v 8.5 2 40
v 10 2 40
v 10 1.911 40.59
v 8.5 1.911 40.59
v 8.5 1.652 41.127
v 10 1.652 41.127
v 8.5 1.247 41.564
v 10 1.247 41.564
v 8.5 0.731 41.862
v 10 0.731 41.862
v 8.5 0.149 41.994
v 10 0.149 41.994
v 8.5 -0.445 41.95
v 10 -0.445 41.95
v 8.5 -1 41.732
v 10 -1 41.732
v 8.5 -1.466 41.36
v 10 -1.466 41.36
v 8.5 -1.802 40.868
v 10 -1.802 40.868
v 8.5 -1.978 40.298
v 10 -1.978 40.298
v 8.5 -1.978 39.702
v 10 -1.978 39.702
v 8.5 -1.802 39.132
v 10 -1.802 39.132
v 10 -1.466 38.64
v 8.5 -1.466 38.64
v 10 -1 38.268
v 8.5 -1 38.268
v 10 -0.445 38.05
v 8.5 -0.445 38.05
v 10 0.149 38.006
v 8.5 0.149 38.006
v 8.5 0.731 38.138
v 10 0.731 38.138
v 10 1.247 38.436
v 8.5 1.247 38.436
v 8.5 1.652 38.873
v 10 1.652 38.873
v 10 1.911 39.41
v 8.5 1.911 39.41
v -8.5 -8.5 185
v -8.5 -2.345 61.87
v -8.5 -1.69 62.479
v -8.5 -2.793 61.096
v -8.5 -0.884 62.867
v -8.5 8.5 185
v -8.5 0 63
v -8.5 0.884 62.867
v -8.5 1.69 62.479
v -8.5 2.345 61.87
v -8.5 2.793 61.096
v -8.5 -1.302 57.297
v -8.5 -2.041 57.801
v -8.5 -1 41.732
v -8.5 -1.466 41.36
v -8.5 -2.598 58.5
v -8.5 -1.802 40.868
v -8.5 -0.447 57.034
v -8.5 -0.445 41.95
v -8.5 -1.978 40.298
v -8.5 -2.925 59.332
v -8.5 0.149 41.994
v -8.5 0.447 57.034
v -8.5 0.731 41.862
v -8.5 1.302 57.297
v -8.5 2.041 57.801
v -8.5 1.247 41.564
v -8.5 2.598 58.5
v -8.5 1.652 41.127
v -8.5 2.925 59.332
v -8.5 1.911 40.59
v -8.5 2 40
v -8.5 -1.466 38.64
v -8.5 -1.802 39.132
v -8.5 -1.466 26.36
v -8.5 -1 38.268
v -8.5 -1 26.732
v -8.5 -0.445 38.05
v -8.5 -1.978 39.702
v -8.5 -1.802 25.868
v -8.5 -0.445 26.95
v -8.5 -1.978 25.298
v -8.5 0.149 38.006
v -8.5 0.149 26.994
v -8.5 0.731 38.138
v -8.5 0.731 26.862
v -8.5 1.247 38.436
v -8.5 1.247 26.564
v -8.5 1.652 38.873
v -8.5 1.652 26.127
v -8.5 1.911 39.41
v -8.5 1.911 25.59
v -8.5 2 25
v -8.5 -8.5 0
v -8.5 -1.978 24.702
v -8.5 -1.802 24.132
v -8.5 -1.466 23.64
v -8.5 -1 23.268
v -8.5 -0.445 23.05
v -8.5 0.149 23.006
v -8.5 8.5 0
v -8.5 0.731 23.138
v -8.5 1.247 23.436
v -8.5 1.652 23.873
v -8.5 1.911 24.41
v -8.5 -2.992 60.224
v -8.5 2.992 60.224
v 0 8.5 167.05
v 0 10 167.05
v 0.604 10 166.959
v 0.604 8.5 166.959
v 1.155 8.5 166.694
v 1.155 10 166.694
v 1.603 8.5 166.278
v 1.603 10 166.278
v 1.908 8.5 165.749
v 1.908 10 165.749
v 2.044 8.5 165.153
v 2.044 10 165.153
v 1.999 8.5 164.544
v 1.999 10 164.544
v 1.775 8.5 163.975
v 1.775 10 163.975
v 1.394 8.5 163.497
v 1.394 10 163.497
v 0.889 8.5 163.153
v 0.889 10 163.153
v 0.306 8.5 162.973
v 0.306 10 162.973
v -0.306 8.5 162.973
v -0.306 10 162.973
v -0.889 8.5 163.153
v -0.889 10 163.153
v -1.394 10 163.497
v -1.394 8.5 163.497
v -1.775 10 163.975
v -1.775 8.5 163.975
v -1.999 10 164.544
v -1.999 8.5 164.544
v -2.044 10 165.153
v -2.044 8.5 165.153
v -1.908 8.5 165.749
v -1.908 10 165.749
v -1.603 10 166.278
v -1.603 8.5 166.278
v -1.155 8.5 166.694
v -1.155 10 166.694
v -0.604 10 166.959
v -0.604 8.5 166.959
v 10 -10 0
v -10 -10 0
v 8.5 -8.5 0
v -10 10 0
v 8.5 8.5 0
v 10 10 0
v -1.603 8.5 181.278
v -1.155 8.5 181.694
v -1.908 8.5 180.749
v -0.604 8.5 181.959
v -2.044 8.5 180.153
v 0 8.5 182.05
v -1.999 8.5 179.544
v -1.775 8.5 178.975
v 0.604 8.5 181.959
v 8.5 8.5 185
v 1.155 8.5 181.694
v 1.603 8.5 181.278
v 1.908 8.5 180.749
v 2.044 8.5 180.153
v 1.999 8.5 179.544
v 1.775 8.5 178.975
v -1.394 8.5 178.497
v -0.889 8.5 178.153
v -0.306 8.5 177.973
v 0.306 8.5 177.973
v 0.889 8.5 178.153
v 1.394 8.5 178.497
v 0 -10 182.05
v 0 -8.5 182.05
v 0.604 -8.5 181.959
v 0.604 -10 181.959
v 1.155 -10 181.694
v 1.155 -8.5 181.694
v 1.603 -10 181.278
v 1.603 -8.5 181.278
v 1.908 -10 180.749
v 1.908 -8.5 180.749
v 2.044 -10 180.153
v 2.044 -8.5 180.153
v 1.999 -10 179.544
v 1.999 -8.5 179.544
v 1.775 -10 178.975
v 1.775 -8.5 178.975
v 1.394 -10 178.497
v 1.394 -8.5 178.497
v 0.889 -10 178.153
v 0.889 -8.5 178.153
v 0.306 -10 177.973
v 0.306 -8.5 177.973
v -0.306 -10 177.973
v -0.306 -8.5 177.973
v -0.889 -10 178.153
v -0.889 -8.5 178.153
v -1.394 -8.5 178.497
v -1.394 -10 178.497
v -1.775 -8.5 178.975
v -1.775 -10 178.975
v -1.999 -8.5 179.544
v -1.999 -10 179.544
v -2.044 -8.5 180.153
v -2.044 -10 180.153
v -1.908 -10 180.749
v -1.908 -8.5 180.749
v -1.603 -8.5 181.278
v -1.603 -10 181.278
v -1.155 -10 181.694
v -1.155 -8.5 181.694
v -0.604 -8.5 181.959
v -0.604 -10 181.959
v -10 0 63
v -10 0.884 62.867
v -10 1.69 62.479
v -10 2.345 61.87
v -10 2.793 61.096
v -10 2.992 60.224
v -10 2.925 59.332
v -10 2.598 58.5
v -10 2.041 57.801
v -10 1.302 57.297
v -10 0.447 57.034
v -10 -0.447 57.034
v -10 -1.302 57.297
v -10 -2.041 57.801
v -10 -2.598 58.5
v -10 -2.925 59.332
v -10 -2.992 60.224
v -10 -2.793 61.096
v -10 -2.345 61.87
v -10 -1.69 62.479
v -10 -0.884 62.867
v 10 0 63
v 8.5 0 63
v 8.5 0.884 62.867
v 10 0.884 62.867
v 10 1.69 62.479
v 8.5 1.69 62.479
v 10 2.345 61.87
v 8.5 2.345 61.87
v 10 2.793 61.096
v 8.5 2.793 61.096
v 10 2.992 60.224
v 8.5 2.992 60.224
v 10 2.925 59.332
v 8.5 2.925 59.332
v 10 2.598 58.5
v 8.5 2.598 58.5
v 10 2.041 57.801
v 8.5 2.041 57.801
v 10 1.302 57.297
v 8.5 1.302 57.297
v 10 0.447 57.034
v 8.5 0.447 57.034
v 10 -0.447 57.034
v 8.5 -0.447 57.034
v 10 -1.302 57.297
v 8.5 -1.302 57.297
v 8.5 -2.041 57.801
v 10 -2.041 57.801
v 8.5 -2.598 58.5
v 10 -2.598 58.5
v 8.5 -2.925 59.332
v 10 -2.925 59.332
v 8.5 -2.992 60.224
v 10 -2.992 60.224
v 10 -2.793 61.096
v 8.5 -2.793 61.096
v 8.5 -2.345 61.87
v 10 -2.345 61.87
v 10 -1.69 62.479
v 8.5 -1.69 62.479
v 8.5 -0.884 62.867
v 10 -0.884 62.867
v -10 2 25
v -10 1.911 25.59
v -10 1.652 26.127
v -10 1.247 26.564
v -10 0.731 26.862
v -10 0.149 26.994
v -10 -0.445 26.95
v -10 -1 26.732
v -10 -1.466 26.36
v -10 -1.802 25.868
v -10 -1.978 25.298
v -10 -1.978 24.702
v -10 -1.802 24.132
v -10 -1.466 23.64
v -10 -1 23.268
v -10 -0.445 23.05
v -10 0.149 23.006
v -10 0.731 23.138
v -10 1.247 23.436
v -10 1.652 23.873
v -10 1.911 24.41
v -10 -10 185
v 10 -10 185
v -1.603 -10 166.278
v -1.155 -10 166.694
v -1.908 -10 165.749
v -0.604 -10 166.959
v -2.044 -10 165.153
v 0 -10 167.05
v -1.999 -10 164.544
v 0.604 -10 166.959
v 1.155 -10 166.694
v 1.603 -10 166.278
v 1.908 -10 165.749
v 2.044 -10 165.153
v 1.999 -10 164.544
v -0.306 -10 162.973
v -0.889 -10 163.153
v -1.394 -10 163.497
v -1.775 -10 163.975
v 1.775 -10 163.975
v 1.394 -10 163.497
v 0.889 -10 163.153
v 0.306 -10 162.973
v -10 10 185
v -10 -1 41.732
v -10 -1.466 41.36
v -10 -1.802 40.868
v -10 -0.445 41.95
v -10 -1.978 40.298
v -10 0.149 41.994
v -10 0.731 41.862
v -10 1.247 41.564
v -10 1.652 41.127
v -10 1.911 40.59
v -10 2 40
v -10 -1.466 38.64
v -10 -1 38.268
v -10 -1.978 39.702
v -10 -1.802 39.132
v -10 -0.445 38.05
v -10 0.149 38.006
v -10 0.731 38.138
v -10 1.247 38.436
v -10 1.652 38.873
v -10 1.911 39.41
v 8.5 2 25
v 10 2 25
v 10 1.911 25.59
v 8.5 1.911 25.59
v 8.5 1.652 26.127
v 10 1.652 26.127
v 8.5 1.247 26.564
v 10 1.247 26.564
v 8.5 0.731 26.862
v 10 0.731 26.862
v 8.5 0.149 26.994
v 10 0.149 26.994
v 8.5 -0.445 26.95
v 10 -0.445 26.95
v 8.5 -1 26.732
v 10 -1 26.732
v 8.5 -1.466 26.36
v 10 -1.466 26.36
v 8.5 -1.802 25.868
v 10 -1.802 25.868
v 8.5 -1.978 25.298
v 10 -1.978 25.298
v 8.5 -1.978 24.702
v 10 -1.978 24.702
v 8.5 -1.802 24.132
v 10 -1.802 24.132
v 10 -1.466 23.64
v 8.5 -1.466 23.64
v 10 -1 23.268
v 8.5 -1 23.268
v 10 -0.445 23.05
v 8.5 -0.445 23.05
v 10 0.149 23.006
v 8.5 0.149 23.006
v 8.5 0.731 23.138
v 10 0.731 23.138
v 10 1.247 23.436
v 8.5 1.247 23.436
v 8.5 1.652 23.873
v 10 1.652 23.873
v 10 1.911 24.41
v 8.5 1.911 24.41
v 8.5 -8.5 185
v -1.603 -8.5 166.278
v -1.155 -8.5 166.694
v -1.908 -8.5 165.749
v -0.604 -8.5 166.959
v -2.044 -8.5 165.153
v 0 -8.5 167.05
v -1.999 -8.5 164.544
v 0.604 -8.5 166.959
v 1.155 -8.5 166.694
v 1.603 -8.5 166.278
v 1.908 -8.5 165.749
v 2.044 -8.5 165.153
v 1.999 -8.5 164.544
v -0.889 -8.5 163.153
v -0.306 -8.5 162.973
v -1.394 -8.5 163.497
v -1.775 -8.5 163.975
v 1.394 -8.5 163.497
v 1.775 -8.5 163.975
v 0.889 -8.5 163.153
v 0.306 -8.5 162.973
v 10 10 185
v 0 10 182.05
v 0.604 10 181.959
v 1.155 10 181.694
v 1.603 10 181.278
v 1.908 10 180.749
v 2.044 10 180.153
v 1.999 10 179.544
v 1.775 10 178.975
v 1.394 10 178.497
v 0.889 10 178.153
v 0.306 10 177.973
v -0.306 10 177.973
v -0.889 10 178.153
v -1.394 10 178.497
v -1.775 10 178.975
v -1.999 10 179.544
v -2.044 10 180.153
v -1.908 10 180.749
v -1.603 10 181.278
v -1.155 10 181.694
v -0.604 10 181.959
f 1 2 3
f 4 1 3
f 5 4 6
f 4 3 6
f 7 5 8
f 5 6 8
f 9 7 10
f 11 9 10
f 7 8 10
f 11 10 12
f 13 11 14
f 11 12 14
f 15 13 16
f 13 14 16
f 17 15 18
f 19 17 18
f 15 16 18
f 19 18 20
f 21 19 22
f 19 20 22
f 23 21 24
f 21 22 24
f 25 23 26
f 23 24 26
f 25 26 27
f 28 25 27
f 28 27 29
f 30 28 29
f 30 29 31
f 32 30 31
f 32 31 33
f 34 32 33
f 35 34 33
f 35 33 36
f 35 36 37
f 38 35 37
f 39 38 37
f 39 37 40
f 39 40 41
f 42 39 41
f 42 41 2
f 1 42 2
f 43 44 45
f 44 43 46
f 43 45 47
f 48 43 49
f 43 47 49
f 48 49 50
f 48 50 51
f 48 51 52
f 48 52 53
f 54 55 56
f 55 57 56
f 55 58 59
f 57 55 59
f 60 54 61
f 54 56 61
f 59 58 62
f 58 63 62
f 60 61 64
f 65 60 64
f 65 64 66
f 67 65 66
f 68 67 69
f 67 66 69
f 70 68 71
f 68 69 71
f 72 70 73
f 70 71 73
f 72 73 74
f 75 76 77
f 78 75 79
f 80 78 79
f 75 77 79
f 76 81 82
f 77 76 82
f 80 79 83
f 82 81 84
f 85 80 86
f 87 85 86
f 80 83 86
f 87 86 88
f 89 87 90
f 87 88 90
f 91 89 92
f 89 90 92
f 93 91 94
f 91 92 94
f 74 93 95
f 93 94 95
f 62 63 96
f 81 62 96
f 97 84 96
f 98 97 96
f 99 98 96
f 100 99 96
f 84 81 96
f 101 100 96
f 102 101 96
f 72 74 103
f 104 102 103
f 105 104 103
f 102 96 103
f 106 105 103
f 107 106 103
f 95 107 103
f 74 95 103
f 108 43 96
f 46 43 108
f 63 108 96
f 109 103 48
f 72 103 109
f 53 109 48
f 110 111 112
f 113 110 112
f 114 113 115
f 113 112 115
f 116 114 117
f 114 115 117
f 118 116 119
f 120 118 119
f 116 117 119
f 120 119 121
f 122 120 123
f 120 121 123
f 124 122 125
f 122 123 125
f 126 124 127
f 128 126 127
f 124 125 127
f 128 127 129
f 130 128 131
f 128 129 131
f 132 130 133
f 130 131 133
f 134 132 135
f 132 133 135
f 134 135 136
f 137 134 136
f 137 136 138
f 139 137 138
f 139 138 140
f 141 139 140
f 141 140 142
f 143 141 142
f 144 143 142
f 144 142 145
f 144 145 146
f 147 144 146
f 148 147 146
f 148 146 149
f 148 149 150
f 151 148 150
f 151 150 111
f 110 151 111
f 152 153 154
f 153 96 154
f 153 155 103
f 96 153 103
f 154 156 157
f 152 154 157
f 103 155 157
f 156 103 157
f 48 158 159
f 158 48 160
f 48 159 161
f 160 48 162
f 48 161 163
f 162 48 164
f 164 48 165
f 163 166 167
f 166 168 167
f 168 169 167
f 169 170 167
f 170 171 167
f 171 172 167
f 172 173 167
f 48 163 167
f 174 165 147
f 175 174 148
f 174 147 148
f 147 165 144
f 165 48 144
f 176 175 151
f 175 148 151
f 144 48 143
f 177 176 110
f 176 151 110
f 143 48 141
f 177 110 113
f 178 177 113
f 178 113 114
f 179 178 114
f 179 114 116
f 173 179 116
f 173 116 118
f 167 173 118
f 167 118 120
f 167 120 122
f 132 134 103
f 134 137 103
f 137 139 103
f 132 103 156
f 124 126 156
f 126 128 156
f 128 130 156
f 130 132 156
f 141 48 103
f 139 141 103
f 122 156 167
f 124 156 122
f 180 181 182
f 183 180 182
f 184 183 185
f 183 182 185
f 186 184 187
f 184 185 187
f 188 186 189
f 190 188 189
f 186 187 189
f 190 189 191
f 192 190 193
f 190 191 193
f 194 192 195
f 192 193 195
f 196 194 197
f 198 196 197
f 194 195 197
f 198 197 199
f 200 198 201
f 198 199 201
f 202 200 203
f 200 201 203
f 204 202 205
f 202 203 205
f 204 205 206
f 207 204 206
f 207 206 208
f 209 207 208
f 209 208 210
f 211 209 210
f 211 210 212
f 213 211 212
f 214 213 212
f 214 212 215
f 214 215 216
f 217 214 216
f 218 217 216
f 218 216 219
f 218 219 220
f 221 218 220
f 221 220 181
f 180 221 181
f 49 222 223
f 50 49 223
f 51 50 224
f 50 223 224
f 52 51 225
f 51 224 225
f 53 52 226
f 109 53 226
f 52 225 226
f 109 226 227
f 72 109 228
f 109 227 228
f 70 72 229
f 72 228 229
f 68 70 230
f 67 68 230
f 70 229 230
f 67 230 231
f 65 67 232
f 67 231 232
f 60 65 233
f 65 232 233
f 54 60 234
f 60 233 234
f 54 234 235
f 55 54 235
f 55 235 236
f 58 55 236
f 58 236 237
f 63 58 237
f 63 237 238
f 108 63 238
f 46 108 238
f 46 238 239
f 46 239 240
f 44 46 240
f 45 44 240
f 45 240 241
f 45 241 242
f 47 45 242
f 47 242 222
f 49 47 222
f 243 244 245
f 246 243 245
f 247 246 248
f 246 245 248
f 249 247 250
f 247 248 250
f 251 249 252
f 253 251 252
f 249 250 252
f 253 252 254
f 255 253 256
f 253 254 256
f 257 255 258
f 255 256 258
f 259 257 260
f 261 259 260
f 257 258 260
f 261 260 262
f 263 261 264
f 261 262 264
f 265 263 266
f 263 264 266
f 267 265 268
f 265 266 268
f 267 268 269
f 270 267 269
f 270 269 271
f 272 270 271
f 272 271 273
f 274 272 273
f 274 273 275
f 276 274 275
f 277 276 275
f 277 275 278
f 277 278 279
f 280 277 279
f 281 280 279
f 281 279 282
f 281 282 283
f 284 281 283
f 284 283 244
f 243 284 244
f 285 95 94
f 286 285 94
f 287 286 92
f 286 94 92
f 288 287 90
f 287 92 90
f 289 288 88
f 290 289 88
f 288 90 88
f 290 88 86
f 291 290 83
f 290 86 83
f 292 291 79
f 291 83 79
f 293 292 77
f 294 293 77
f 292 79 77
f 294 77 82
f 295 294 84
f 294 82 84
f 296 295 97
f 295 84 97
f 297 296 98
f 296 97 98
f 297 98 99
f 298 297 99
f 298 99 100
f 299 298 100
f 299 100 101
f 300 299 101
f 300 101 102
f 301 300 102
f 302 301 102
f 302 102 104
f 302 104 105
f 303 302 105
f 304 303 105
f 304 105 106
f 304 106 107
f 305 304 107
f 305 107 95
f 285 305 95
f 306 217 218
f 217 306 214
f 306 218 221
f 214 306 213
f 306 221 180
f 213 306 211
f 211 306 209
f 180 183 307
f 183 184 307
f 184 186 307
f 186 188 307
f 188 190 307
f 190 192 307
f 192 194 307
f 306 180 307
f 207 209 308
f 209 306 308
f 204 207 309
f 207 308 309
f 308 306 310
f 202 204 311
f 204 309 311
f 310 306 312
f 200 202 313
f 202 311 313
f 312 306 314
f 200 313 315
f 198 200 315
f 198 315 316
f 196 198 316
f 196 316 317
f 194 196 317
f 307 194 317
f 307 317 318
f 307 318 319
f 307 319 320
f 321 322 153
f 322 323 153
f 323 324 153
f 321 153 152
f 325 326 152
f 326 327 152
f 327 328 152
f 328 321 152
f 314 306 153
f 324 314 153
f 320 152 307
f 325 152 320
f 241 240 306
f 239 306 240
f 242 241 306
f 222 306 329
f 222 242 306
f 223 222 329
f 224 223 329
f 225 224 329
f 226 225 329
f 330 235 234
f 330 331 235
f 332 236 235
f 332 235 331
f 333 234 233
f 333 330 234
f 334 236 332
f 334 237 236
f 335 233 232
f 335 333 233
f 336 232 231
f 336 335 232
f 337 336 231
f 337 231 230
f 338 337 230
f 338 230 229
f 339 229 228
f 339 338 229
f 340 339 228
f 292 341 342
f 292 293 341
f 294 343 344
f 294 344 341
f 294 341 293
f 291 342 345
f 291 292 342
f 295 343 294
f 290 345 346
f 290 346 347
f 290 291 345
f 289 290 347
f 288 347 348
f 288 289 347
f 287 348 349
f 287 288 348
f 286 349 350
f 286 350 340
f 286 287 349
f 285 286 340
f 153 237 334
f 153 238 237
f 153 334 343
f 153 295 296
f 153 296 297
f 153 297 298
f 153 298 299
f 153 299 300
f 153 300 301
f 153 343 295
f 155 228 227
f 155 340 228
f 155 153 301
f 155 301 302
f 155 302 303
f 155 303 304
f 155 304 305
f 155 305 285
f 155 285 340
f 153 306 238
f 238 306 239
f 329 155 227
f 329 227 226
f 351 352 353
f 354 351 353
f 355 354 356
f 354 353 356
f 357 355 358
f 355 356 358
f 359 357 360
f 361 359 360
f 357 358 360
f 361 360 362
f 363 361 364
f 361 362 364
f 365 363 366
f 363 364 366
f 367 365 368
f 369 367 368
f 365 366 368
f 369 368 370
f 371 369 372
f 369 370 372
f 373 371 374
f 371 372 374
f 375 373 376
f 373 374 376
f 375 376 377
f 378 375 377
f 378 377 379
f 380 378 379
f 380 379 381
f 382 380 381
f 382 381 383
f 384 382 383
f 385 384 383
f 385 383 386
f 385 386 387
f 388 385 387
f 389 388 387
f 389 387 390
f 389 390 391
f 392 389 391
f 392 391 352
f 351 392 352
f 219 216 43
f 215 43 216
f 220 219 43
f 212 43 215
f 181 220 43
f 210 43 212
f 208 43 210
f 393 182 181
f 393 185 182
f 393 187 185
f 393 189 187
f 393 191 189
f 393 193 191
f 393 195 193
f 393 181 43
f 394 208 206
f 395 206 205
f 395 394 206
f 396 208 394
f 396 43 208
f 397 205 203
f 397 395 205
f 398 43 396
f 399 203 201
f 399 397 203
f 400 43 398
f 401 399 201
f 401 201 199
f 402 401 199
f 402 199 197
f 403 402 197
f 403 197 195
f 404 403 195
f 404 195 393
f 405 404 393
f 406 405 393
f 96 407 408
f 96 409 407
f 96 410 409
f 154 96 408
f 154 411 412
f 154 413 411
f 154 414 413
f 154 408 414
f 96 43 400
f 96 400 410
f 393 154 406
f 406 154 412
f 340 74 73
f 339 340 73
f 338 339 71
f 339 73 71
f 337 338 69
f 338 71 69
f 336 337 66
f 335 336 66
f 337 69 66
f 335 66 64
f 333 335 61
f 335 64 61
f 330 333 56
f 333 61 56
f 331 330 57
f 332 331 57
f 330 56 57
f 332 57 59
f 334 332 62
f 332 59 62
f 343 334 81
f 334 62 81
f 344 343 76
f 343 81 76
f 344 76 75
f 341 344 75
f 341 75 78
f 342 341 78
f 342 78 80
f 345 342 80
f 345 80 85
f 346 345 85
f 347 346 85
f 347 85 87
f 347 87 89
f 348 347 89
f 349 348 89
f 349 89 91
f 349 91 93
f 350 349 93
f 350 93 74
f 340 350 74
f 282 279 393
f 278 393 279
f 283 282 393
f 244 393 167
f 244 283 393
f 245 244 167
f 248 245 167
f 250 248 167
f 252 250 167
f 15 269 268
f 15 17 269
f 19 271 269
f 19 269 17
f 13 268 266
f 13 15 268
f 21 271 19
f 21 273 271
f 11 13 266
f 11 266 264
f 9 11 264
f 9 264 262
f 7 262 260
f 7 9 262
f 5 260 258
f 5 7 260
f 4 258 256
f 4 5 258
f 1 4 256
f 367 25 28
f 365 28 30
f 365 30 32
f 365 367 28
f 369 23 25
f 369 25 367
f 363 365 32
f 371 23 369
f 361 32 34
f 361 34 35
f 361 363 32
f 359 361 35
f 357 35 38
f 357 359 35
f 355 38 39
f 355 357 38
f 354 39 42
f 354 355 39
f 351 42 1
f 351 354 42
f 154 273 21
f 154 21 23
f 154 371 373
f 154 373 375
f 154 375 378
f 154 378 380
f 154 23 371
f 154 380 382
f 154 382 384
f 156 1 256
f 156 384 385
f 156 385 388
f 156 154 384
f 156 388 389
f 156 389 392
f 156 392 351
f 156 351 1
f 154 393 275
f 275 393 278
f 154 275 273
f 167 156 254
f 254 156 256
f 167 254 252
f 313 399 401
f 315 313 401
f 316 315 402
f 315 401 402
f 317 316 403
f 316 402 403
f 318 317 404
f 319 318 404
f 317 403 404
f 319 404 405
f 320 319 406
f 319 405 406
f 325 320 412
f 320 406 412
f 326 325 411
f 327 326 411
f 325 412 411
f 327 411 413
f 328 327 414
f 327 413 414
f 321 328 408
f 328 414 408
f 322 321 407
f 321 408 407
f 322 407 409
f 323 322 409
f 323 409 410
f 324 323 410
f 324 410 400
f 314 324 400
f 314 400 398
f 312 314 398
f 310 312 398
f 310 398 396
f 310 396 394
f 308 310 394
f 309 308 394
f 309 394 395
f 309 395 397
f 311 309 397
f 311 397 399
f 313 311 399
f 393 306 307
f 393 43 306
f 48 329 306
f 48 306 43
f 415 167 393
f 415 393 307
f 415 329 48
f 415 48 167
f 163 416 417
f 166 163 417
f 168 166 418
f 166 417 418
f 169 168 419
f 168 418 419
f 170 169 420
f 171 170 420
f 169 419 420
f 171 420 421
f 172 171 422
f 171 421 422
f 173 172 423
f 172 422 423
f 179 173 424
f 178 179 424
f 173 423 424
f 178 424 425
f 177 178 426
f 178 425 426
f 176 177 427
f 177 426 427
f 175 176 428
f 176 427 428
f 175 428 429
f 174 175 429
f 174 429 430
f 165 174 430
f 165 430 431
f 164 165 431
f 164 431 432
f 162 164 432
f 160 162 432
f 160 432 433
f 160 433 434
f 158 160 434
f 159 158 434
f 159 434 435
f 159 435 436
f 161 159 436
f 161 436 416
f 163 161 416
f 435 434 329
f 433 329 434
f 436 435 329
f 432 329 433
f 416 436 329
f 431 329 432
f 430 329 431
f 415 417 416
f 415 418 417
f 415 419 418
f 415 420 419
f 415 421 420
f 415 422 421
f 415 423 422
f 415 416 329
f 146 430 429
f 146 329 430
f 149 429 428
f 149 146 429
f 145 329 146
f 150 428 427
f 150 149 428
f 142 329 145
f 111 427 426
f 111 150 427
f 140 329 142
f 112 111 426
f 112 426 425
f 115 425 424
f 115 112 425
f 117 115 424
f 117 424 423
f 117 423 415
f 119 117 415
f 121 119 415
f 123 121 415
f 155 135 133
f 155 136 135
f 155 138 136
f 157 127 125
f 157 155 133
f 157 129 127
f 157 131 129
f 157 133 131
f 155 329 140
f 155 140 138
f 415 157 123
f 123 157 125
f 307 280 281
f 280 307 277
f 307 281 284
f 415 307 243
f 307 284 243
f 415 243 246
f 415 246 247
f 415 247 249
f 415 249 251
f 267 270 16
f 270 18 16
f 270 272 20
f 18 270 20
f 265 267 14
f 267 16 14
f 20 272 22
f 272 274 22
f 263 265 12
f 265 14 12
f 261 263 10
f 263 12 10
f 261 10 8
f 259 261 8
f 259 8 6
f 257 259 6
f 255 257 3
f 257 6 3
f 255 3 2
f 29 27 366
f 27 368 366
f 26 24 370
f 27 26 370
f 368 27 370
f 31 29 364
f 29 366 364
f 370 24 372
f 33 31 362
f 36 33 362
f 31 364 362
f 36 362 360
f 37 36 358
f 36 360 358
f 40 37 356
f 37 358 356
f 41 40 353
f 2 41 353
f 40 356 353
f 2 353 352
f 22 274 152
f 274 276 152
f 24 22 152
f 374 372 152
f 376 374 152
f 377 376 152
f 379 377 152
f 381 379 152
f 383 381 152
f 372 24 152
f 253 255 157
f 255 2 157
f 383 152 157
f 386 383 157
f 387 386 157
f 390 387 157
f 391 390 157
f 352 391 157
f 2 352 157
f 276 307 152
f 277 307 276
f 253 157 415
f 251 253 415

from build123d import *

# Parameters (mm, degrees)
SKETCH_1_W          = 20
SKETCH_1_H          = 20
SKETCH_1_W_2        = 17
SKETCH_1_H_2        = 17
EXTRUDE_1_DEPTH     = 185
SKETCH_2_R          = 2.05
CUT_EXTRUDE_1_DEPTH = 187.346451536
SKETCH_3_R          = 2
CUT_EXTRUDE_2_DEPTH = 187.346451536
SKETCH_4_R          = 3
CUT_EXTRUDE_3_DEPTH = 187.346451536


with BuildPart() as part:
    # 草图1 → 凸台-拉伸1 (new body)
    with BuildSketch(Plane.XY):
        Rectangle(SKETCH_1_W, SKETCH_1_H)
        Rectangle(SKETCH_1_W_2, SKETCH_1_H_2, mode=Mode.SUBTRACT)
    extrude(amount=EXTRUDE_1_DEPTH)

    # 草图2 → 切除-拉伸1 (cut, through all)
    with BuildSketch(Plane(origin=(0, 10, 0), x_dir=(1, 0, 0), z_dir=(0, 1, 0))):
        with Locations(Location((0, -180, 0), (0, 0, 270))):
            Circle(SKETCH_2_R)
        with Locations(Location((0, -165, 0), (0, 0, 270))):
            Circle(SKETCH_2_R)
    extrude(amount=-CUT_EXTRUDE_1_DEPTH, mode=Mode.SUBTRACT)

    # 草图3 → 切除-拉伸2 (cut, through all)
    with BuildSketch(Plane(origin=(10, 0, 0), x_dir=(0, 0, -1), z_dir=(1, 0, 0))):
        with Locations(Location((-25, 0, 0), (0, 0, 90))):
            Circle(SKETCH_3_R)
        with Locations(Location((-40, 0, 0), (0, 0, 90))):
            Circle(SKETCH_3_R)
    extrude(amount=-CUT_EXTRUDE_2_DEPTH, mode=Mode.SUBTRACT)

    # 草图4 → 切除-拉伸3 (cut, through all)
    with BuildSketch(Plane.ZY.offset(10)):
        with Locations((60, 0)):
            Circle(SKETCH_4_R)
    extrude(amount=-CUT_EXTRUDE_3_DEPTH, mode=Mode.SUBTRACT)


solid = part.part
